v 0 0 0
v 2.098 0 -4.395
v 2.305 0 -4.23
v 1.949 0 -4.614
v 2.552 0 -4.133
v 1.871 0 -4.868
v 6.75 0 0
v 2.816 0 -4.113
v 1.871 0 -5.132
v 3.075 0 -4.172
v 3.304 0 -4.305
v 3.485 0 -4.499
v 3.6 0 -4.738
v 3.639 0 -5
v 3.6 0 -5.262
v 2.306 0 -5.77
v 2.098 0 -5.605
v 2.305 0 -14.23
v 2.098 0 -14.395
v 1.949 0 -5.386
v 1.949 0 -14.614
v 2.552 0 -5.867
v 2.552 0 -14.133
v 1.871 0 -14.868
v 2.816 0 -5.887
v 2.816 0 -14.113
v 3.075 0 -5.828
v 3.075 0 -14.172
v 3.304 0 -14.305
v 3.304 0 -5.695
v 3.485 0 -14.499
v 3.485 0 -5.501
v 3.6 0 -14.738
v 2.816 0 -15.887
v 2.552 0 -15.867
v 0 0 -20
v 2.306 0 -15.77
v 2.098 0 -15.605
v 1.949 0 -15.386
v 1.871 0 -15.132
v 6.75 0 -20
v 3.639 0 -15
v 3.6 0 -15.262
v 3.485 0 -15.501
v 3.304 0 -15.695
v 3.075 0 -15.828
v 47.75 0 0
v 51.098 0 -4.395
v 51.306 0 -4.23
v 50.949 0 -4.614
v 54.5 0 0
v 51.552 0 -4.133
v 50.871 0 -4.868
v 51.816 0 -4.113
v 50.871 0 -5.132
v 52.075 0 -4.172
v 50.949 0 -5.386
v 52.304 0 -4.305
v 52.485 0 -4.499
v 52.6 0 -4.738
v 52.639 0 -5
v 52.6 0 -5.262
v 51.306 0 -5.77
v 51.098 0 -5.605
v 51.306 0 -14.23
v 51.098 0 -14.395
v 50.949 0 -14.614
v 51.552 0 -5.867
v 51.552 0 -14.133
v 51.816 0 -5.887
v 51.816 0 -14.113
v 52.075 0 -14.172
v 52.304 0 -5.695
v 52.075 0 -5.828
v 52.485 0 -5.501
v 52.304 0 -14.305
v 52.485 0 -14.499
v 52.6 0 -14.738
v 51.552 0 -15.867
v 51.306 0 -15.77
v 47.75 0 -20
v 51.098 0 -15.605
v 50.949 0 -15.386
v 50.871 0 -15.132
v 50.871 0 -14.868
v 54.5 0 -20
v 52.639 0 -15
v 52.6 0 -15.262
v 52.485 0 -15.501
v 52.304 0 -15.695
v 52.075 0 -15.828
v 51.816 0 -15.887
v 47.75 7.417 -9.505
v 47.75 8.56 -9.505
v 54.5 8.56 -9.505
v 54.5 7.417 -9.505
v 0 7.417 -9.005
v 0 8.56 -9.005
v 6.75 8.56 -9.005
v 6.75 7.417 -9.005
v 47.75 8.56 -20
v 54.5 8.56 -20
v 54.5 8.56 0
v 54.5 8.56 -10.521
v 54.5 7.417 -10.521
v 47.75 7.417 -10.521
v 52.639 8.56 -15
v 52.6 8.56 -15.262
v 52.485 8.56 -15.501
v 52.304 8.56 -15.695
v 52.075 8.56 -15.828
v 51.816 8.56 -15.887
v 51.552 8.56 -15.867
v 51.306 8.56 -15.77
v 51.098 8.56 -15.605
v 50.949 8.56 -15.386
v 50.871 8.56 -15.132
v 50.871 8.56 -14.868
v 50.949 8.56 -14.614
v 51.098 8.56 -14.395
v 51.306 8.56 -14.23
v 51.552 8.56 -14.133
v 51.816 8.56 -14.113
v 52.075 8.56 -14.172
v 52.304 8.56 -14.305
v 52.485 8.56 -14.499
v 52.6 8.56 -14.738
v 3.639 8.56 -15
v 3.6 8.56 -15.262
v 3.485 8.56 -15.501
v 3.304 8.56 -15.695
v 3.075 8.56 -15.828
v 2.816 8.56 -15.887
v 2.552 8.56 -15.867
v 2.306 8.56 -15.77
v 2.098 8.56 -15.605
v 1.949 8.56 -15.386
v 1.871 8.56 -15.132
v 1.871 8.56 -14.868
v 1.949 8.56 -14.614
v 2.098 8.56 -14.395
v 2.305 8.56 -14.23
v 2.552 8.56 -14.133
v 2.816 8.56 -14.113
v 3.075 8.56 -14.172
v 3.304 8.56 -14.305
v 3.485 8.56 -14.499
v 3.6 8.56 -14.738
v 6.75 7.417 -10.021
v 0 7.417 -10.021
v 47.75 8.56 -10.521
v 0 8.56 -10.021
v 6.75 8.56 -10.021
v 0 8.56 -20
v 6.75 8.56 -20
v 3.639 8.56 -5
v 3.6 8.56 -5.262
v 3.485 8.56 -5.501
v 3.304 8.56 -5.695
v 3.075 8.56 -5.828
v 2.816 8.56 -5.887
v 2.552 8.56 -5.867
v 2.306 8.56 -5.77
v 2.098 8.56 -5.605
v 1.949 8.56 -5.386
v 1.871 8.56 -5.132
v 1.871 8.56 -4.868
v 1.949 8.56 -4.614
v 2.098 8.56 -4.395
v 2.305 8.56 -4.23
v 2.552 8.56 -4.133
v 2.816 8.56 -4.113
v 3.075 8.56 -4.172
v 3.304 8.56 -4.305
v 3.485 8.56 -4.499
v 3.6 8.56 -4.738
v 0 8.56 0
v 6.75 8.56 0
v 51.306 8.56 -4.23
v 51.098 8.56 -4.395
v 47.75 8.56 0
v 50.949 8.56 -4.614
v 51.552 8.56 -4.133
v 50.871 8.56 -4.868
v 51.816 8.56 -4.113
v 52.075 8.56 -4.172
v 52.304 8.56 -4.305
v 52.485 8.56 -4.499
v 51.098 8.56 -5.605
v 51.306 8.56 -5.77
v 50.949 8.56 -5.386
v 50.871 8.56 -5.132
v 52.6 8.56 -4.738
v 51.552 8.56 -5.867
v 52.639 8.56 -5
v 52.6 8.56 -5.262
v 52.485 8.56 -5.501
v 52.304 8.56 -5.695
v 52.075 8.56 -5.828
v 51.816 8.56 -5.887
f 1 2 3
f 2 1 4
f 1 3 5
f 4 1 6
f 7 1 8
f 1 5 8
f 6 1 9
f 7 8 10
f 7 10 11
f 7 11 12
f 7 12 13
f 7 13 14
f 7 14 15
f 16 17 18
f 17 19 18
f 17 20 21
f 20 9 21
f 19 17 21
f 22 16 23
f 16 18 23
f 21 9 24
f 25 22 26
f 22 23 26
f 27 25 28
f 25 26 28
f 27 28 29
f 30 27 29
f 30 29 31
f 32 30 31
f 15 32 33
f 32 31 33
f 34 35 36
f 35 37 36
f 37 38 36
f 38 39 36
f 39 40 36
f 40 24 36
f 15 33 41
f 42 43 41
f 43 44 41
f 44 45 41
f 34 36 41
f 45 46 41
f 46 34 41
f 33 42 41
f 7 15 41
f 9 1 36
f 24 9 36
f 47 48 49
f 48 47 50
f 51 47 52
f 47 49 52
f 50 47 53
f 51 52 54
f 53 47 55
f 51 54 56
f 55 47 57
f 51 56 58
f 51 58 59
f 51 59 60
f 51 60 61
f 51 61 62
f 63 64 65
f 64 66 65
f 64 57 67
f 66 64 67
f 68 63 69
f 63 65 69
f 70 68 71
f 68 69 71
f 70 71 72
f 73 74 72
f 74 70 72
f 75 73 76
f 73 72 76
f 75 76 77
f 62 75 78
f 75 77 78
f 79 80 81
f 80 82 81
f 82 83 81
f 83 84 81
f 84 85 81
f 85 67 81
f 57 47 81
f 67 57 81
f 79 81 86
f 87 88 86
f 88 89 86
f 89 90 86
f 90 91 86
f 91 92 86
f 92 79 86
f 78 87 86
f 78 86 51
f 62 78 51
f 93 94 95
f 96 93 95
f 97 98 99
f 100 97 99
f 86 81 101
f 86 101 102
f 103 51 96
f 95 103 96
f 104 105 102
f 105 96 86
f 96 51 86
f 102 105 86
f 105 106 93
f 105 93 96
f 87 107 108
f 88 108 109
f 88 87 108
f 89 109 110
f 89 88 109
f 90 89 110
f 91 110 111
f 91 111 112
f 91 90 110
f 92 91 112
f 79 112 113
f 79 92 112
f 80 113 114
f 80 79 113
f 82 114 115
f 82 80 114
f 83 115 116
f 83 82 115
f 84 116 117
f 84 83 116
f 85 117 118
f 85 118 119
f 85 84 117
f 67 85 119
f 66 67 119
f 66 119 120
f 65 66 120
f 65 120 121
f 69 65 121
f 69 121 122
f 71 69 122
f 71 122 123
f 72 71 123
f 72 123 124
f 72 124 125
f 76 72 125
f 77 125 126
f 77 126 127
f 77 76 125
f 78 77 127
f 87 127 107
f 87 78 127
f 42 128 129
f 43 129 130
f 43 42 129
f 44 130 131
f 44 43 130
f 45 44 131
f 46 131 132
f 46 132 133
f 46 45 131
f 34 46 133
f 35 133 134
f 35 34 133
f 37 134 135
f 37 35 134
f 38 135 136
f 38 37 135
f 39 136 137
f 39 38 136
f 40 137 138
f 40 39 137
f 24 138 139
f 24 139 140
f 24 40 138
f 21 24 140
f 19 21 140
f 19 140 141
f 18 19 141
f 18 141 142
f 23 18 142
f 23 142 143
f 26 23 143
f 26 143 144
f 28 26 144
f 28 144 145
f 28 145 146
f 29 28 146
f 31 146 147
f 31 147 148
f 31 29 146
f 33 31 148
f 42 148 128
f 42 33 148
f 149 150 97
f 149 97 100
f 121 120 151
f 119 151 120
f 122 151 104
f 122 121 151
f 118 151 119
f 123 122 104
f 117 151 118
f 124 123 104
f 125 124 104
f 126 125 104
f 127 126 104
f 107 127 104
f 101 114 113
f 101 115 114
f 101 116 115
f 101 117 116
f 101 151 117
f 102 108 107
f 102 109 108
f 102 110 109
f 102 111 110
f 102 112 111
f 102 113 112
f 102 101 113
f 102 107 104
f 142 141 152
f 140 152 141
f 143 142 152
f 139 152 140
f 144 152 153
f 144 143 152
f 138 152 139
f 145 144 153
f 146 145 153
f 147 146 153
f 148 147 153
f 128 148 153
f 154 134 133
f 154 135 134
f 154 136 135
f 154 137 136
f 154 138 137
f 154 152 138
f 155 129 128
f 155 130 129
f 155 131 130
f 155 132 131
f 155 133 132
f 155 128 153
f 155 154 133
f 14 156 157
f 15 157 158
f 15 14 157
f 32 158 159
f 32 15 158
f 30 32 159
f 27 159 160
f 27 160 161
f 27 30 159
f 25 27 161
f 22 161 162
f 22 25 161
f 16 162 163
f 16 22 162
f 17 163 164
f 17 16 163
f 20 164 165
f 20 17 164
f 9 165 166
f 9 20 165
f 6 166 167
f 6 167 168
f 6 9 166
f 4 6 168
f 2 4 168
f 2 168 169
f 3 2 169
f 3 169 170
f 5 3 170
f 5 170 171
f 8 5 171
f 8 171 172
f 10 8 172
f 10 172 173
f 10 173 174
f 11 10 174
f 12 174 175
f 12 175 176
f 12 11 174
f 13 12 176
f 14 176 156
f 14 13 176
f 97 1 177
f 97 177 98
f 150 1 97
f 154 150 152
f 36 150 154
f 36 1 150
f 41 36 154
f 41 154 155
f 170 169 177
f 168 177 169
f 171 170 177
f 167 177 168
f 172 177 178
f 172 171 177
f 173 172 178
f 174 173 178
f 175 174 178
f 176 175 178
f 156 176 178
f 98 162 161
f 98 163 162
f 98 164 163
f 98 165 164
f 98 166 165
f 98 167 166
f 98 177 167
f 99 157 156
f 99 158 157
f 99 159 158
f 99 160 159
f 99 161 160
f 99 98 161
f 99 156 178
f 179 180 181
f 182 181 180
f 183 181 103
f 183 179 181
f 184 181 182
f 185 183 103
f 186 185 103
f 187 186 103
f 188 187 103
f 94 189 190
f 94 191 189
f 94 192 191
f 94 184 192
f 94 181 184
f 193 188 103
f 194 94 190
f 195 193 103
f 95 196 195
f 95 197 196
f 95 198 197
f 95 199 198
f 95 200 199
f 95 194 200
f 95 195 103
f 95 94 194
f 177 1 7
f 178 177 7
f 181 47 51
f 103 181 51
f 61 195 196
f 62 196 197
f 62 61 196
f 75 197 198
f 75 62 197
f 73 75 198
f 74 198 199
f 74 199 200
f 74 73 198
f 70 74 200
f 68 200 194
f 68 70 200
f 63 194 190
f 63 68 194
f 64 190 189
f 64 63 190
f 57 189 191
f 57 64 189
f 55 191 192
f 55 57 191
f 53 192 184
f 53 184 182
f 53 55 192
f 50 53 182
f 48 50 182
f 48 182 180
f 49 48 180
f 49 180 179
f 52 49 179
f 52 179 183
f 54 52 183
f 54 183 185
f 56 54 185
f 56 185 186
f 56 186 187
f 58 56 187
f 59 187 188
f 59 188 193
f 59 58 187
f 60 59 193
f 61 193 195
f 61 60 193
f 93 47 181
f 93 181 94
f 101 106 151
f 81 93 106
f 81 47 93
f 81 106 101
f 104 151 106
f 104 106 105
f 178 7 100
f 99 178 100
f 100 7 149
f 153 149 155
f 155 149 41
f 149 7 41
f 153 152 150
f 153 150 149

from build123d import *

# Parameters (mm, degrees)
SKETCH1_W             = 6.75
SKETCH1_H             = 20
SKETCH1_R             = 0.889
BOSS_EXTRUDE1_DEPTH   = 8.5598
BOSS_EXTRUDE1_2_DEPTH = 8.5598
SKETCH2_W             = 6.75
SKETCH2_H             = 1.016
CUT_EXTRUDE1_DEPTH    = 1.143


with BuildPart() as part:
    # Sketch1 → Boss-Extrude1 (new body)
    with BuildSketch(Plane(origin=(0, 0, 0), x_dir=(1, 0, 0), z_dir=(0, 1, 0))):
        with Locations((3.375, 10)):
            Rectangle(SKETCH1_W, SKETCH1_H)
        with Locations((2.75, 15)):
            Circle(SKETCH1_R, mode=Mode.SUBTRACT)
        with Locations((2.75, 5)):
            Circle(SKETCH1_R, mode=Mode.SUBTRACT)
    extrude(amount=BOSS_EXTRUDE1_DEPTH)


with BuildPart() as body_2:
    # Sketch1 → Boss-Extrude1 2 (new body)
    with BuildSketch(Plane(origin=(0, 0, 0), x_dir=(1, 0, 0), z_dir=(0, 1, 0))):
        with Locations((51.125, 10)):
            Rectangle(SKETCH1_W, SKETCH1_H)
        with Locations((51.75, 15)):
            Circle(SKETCH1_R, mode=Mode.SUBTRACT)
        with Locations((51.75, 5)):
            Circle(SKETCH1_R, mode=Mode.SUBTRACT)
    extrude(amount=BOSS_EXTRUDE1_2_DEPTH)


with BuildPart() as cut_extrude1_tool:
    # Sketch2 → Cut-Extrude1 (new body)
    with BuildSketch(Plane(origin=(0, 8.5598, 0), x_dir=(1, 0, 0), z_dir=(0, 1, 0))):
        with Locations((3.375, 9.513485429)):
            Rectangle(SKETCH2_W, SKETCH2_H)
        with Locations((51.125, 10.013485429)):
            Rectangle(SKETCH2_W, SKETCH2_H)
    extrude(amount=-CUT_EXTRUDE1_DEPTH)


with BuildPart() as part_1:
    add(part.part)

    # Cut-Extrude1: cut by cut_extrude1_tool
    add(cut_extrude1_tool.part, mode=Mode.SUBTRACT)


with BuildPart() as body_2_1:
    add(body_2.part)

    # Cut-Extrude1: cut by cut_extrude1_tool
    add(cut_extrude1_tool.part, mode=Mode.SUBTRACT)


solid = Compound([part_1.part, body_2_1.part])
